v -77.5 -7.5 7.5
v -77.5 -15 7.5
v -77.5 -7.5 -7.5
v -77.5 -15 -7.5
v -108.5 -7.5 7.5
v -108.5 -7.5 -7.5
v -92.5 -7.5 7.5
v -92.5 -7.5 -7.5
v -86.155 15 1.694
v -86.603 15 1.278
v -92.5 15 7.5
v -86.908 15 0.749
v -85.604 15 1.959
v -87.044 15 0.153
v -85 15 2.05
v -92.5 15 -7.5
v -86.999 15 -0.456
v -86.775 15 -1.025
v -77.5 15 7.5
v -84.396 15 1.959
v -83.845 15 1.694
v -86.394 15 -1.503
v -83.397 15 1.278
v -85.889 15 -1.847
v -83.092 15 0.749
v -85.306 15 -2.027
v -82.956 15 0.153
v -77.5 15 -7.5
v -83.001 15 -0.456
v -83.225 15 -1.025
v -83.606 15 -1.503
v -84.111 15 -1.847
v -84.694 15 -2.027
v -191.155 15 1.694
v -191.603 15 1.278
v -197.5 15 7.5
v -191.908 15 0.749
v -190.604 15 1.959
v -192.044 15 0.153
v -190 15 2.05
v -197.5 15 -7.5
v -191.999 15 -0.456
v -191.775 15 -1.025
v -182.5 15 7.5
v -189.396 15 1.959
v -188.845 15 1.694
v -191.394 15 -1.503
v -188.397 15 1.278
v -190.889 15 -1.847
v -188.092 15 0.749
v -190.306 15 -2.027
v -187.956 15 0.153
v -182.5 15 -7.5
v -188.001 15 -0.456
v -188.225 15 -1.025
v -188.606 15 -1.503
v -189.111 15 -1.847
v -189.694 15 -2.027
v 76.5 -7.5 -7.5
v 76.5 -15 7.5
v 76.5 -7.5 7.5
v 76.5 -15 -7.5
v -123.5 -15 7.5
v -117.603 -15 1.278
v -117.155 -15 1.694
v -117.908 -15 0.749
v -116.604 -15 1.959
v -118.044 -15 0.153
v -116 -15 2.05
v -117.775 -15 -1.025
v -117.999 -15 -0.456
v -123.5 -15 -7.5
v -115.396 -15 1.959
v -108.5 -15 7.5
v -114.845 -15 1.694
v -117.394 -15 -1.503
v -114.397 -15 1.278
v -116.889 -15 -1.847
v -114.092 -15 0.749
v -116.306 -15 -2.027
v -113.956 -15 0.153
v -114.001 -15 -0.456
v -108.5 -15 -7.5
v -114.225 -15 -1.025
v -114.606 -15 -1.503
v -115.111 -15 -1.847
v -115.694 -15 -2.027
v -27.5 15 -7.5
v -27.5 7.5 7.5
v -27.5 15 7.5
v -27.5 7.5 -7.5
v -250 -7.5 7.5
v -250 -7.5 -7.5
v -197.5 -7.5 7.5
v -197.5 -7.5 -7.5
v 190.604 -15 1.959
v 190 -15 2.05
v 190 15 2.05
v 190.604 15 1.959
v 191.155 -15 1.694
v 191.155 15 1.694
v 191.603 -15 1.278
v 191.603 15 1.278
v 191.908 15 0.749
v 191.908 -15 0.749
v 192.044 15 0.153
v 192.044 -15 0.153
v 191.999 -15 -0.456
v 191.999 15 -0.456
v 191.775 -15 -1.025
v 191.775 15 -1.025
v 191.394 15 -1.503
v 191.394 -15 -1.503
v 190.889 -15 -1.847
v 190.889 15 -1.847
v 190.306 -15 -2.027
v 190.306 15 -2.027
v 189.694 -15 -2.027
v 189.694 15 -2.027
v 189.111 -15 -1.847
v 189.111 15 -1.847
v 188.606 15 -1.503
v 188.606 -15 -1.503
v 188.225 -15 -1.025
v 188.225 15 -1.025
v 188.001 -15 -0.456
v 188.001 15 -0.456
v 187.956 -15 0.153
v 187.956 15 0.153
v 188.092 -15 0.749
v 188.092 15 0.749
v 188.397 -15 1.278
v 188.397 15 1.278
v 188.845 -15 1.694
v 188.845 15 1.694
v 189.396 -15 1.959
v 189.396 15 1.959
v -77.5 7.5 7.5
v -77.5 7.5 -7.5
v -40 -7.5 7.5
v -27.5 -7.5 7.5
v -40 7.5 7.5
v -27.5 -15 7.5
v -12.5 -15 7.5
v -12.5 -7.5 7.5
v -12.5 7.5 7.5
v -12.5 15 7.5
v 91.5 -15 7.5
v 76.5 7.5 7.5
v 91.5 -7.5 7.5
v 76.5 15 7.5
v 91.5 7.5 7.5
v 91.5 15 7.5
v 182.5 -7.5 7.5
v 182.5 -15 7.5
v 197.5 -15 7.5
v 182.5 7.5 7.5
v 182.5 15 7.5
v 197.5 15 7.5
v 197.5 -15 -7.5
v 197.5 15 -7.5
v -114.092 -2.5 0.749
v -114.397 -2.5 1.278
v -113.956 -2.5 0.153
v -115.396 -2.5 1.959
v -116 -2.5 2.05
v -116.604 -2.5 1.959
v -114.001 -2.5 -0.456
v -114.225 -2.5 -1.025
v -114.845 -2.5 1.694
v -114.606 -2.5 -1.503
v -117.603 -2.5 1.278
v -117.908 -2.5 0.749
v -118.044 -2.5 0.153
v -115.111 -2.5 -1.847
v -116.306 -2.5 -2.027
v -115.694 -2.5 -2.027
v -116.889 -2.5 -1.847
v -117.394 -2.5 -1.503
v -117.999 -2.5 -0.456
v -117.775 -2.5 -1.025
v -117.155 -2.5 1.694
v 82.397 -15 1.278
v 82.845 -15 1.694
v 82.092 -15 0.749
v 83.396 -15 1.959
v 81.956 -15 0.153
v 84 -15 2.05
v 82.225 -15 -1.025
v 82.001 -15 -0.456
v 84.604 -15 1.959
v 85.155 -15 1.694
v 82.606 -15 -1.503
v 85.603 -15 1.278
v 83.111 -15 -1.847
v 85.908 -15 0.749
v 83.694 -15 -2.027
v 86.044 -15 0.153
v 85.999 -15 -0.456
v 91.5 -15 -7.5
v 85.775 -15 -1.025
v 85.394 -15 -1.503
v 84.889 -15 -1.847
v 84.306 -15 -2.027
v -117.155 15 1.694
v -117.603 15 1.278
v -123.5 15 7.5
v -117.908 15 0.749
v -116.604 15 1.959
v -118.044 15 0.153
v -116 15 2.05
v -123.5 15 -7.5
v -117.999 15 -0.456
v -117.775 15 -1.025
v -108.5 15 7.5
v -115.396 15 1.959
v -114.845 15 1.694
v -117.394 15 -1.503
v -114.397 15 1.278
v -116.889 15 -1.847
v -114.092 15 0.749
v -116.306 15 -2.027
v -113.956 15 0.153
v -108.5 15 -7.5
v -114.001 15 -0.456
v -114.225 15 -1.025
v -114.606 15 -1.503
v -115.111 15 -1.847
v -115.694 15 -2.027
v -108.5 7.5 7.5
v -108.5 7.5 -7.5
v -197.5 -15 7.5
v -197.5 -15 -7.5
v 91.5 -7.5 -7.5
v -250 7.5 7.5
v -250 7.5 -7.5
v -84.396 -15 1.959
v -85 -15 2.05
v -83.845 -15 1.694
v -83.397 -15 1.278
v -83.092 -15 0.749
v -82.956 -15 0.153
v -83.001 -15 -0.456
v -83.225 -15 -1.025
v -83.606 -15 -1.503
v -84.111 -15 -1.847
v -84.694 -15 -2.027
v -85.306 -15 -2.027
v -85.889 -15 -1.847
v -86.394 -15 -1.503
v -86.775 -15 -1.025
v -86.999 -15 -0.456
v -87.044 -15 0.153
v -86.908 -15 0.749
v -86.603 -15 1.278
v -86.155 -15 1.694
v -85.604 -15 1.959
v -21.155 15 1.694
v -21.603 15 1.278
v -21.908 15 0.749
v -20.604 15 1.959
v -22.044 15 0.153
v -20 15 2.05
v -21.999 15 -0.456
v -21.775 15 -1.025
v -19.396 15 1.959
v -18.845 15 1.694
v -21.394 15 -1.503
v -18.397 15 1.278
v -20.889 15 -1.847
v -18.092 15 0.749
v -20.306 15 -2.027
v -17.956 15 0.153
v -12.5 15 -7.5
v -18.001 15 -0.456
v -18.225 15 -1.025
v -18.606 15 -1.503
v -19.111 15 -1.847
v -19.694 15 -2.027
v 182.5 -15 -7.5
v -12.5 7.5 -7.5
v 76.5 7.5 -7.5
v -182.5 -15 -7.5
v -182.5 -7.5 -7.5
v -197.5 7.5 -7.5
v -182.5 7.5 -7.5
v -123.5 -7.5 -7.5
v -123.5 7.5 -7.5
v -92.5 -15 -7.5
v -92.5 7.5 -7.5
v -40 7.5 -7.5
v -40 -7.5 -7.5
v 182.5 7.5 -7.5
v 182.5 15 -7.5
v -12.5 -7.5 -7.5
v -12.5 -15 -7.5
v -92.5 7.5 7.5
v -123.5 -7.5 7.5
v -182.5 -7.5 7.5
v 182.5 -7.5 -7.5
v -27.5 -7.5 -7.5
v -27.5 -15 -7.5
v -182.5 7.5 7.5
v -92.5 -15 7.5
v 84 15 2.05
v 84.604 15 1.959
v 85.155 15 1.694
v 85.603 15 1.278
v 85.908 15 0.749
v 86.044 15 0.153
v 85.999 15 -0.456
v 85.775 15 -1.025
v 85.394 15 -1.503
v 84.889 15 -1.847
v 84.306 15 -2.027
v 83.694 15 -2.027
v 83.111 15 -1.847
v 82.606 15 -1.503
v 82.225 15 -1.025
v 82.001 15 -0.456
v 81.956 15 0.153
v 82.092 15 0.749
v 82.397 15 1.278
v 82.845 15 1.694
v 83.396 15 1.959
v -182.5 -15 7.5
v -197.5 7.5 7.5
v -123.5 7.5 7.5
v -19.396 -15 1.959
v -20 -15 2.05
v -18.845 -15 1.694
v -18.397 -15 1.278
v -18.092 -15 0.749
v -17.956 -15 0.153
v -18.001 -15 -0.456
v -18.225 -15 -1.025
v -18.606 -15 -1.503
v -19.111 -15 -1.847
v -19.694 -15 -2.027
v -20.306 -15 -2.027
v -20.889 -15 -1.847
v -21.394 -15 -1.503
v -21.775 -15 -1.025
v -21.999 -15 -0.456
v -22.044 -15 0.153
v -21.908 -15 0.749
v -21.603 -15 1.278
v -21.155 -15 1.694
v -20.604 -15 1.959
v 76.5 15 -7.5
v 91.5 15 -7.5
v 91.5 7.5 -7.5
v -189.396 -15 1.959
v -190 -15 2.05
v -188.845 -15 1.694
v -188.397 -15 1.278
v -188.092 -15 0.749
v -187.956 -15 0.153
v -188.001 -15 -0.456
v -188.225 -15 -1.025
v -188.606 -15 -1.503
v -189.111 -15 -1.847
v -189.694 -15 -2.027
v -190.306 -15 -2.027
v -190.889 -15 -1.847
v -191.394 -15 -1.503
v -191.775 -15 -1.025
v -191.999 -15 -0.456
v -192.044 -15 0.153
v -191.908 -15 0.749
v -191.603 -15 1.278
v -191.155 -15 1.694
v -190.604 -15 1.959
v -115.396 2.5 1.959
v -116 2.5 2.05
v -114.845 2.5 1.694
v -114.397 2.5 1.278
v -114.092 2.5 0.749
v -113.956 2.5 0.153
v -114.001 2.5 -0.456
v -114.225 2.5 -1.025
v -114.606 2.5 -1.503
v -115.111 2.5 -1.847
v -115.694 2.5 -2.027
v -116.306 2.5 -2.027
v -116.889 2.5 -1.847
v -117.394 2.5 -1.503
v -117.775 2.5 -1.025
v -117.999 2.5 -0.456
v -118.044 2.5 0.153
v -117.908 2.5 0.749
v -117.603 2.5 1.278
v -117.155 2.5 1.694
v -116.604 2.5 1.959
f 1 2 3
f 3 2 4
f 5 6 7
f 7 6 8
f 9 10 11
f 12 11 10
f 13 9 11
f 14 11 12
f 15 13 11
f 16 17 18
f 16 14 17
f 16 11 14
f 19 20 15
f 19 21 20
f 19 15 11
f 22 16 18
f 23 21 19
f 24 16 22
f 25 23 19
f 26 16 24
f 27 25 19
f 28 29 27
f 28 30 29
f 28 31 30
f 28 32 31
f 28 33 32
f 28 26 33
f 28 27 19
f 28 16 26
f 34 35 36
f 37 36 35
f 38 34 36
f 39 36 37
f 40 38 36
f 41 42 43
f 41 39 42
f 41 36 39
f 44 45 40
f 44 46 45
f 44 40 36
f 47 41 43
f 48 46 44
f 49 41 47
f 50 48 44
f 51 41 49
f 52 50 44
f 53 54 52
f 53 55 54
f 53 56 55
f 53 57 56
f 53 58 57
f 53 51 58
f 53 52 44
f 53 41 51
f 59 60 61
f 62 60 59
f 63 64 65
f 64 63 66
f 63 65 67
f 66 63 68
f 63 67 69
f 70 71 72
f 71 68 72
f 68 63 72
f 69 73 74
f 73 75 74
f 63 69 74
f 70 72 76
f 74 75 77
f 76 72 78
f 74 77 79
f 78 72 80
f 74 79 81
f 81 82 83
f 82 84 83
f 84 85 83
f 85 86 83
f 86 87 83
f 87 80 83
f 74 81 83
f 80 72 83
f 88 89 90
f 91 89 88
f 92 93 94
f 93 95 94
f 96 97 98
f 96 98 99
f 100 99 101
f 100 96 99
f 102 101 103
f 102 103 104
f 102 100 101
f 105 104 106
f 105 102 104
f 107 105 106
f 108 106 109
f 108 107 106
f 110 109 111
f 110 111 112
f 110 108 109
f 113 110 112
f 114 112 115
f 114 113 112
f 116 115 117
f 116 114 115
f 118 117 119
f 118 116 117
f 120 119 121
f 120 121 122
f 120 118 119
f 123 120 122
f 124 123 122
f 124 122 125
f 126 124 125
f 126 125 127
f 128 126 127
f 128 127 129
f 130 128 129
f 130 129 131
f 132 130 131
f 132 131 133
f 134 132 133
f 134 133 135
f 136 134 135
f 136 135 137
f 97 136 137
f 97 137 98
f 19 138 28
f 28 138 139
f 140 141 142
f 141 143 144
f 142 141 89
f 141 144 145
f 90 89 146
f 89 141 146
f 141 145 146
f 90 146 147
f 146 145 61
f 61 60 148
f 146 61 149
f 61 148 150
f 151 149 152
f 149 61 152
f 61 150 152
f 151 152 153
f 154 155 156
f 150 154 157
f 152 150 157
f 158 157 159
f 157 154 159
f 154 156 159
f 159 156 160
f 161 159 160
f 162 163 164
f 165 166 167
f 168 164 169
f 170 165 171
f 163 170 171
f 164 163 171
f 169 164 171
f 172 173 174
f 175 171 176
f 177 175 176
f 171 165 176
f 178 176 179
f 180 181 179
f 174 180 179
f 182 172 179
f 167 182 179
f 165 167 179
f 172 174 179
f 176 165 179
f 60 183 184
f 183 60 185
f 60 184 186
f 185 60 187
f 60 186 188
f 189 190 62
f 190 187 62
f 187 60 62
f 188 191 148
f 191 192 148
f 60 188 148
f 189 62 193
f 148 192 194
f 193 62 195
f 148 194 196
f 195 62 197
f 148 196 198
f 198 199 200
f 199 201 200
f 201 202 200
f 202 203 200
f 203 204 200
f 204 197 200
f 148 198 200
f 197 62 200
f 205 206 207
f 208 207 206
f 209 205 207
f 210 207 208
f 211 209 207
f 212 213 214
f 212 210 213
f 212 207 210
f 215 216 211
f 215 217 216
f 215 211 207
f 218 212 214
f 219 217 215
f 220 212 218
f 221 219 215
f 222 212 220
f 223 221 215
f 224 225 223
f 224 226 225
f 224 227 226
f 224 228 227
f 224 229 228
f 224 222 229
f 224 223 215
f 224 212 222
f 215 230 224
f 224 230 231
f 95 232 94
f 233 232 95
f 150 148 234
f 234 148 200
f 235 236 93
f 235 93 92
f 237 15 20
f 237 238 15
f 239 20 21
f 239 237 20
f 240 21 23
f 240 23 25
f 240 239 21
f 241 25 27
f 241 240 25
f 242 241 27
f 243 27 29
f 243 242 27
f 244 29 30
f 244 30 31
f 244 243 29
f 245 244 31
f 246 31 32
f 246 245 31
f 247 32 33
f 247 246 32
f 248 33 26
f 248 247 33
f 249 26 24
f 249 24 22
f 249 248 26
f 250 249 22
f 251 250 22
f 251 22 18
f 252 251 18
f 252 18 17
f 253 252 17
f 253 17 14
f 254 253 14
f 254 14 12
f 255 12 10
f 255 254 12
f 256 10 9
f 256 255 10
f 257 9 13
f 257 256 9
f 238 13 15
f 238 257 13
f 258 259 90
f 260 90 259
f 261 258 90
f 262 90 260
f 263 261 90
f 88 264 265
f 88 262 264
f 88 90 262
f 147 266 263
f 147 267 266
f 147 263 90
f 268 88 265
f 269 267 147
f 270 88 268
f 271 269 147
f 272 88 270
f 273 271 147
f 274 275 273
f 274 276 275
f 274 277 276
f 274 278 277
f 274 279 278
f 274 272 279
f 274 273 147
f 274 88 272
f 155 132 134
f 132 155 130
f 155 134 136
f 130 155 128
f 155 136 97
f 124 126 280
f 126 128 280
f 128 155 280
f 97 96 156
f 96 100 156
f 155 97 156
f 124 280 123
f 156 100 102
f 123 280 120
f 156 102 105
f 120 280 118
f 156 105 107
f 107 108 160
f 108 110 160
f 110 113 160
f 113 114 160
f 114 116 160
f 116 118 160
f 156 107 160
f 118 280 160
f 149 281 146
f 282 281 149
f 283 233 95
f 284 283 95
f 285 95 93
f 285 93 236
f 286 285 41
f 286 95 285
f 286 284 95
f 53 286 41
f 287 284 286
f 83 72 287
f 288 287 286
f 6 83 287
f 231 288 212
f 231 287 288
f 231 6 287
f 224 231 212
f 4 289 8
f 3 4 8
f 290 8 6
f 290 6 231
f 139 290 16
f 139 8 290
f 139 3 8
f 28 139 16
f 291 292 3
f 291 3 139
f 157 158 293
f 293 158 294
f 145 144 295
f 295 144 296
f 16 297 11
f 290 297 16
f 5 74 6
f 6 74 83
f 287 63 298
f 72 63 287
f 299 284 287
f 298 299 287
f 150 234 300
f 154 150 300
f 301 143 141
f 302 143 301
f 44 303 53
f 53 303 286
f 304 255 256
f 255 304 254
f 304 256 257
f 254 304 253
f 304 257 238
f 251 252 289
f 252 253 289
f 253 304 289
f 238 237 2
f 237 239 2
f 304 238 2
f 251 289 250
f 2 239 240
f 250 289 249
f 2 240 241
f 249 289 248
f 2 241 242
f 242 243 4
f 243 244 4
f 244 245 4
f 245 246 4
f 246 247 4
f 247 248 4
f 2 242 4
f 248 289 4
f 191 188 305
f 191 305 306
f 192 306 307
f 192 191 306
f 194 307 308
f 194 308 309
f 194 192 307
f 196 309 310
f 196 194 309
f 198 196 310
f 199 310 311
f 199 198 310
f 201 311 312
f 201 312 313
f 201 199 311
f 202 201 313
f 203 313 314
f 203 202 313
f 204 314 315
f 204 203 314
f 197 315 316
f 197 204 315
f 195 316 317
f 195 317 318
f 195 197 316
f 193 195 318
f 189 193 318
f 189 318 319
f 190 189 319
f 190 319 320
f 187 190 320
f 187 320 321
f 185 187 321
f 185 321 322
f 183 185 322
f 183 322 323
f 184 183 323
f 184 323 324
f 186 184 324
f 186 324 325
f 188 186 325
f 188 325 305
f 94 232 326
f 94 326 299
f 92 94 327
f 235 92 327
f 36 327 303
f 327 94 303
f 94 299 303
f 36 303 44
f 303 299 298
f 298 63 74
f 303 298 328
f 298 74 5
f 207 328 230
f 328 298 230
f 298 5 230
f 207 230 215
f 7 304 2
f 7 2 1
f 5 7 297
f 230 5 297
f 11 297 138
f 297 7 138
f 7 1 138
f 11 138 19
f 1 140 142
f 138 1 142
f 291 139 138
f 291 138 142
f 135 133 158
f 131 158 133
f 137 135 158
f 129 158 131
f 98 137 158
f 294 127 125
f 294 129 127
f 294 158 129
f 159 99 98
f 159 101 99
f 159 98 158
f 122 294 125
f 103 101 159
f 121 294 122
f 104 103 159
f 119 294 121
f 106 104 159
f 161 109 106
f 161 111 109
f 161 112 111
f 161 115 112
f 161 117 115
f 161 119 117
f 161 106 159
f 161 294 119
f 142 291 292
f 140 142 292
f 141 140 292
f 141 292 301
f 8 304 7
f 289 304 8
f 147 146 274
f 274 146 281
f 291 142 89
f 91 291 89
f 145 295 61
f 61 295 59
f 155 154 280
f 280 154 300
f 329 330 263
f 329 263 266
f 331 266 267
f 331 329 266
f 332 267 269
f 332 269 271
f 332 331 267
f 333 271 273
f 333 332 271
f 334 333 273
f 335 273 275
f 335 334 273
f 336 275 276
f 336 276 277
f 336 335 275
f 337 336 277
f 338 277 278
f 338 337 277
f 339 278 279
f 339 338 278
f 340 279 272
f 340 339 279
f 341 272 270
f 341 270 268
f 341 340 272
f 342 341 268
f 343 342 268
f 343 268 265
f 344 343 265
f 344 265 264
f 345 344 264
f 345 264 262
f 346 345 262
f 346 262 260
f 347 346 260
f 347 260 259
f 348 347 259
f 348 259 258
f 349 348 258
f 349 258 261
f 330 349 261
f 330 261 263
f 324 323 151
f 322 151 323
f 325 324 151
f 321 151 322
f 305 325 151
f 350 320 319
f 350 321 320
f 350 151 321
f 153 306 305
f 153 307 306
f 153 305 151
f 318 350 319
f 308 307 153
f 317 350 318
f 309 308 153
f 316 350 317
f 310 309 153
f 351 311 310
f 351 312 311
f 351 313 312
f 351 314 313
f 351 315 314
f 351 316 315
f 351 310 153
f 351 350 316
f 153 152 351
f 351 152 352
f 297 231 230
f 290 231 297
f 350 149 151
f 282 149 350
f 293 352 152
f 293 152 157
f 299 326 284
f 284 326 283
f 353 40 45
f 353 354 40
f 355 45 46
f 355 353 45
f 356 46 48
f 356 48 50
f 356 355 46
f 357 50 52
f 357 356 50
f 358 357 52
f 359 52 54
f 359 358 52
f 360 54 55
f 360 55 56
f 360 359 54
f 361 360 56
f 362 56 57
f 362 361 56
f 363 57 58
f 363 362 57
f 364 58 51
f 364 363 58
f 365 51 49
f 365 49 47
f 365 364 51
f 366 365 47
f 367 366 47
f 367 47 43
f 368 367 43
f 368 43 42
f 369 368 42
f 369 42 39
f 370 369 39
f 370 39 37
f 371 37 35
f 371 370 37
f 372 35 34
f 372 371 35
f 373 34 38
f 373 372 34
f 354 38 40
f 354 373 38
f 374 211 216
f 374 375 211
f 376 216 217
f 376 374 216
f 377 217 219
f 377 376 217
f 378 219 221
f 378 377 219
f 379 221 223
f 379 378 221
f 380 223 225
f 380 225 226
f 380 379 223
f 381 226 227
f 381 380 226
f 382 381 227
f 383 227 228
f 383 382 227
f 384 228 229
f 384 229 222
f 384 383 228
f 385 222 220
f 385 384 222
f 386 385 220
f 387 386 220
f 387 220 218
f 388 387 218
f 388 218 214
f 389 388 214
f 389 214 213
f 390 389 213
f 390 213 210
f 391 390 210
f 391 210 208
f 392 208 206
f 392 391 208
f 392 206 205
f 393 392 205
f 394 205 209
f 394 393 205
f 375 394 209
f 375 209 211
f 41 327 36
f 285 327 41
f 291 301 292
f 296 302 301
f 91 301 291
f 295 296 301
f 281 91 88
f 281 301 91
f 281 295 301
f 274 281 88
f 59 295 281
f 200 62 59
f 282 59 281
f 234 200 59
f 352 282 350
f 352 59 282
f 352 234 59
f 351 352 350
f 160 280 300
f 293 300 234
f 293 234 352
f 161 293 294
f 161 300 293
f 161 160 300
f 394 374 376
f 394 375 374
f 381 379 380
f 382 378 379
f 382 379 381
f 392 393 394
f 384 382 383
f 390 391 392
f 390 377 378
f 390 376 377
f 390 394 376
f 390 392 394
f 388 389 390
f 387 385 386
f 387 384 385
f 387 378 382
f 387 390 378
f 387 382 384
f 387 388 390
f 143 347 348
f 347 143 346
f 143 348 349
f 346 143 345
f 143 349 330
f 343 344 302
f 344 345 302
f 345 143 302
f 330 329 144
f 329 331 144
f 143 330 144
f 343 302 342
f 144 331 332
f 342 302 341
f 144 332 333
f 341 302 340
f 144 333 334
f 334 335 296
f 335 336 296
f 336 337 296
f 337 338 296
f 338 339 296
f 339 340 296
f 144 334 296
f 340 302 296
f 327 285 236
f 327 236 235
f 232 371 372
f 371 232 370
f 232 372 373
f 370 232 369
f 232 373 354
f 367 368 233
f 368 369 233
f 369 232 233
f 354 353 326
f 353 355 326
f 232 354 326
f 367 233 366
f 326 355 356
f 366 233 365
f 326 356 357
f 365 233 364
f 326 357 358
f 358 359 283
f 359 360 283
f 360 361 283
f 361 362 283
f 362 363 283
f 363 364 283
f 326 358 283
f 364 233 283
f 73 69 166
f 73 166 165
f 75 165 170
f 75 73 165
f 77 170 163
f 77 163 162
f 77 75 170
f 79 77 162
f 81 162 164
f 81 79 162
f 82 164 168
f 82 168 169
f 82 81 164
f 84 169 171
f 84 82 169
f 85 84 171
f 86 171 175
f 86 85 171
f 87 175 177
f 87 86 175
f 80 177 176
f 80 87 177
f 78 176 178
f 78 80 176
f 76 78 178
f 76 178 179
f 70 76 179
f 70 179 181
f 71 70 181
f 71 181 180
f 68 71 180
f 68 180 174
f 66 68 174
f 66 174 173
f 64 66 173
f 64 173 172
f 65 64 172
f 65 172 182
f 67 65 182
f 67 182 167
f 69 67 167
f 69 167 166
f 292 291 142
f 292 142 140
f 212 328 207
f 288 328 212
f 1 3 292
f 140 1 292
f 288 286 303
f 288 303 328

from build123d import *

# Parameters (mm, degrees)
SKETCH1_W                  = 400
SKETCH1_H                  = 15
BOSS_EXTRUDE1_DEPTH        = 7.5
F_4_1_4_1_DIAMETER_HOLE1_D = 4.1
SKETCH4_R                  = 2.05
BOSS_EXTRUDE2_DEPTH        = 2.5
SKETCH5_W                  = 15
SKETCH5_H                  = 15
SKETCH5_R                  = 2.05
BOSS_EXTRUDE3_DEPTH        = 15
SKETCH6_W                  = 15
SKETCH6_H                  = 15
BOSS_EXTRUDE5_DEPTH        = 50
SKETCH8_W                  = 15
SKETCH8_H                  = 15
CUT_EXTRUDE1_DEPTH         = 2.5
SPLIT1_SURFACE_1_BACK      = 449.755
SPLIT1_SURFACE_1_DEPTH     = 899.51
SPLIT1_SURFACE_2_BACK      = 449.755
SPLIT1_SURFACE_2_DEPTH     = 899.51


with BuildPart() as part:
    # Sketch1 → Boss-Extrude1 (new, symmetric)
    with BuildSketch(Plane(origin=(0, 0, 0), x_dir=(1, 0, 0), z_dir=(0, 1, 0))):
        Rectangle(SKETCH1_W, SKETCH1_H)
    extrude(amount=BOSS_EXTRUDE1_DEPTH, both=True)

    # Ø4.1 (4.1) Diameter Hole1 (through all)
    with Locations(Plane.XZ.offset(7.5)):
        with Locations((-190, 0), (-116, 0), (-85, 0), (-20, 0), (84, 0), (190, 0)):
            Hole(F_4_1_4_1_DIAMETER_HOLE1_D / 2)

    # Sketch4 → Boss-Extrude2 (add, symmetric)
    with BuildSketch(Plane(origin=(0, 0, 0), x_dir=(1, 0, 0), z_dir=(0, 1, 0))):
        with Locations(Location((-116, 0, 0), (0, 0, 90))):
            Circle(SKETCH4_R)
    extrude(amount=BOSS_EXTRUDE2_DEPTH, both=True)

    # Sketch5 → Boss-Extrude3 (add, symmetric)
    with BuildSketch(Plane(origin=(0, 0, 0), x_dir=(1, 0, 0), z_dir=(0, 1, 0))):
        with Locations((-190, 0)):
            Rectangle(SKETCH5_W, SKETCH5_H)
        with Locations(Location((-190, 0, 0), (0, 0, 270))):
            Circle(SKETCH5_R, mode=Mode.SUBTRACT)
        with Locations((-116, 0)):
            Rectangle(SKETCH5_W, SKETCH5_H)
        with Locations(Location((-116, 0, 0), (0, 0, 270))):
            Circle(SKETCH5_R, mode=Mode.SUBTRACT)
        with Locations((-85, 0)):
            Rectangle(SKETCH5_W, SKETCH5_H)
        with Locations(Location((-85, 0, 0), (0, 0, 270))):
            Circle(SKETCH5_R, mode=Mode.SUBTRACT)
        with Locations((-20, 0)):
            Rectangle(SKETCH5_W, SKETCH5_H)
        with Locations(Location((-20, 0, 0), (0, 0, 270))):
            Circle(SKETCH5_R, mode=Mode.SUBTRACT)
        with Locations((84, 0)):
            Rectangle(SKETCH5_W, SKETCH5_H)
        with Locations(Location((84, 0, 0), (0, 0, 270))):
            Circle(SKETCH5_R, mode=Mode.SUBTRACT)
        with Locations((190, 0)):
            Rectangle(SKETCH5_W, SKETCH5_H)
        with Locations(Location((190, 0, 0), (0, 0, 270))):
            Circle(SKETCH5_R, mode=Mode.SUBTRACT)
    extrude(amount=BOSS_EXTRUDE3_DEPTH, both=True)

    # Sketch6 → Boss-Extrude5 (add)
    with BuildSketch(Plane.ZY.offset(200)):
        Rectangle(SKETCH6_W, SKETCH6_H)
    extrude(amount=BOSS_EXTRUDE5_DEPTH)

    # Sketch8 → Cut-Extrude1 (cut)
    with BuildSketch(Plane(origin=(200, 0, 0), x_dir=(0, 0, -1), z_dir=(1, 0, 0))):
        Rectangle(SKETCH8_W, SKETCH8_H)
    extrude(amount=-CUT_EXTRUDE1_DEPTH, mode=Mode.SUBTRACT)


with BuildPart() as body_2:
    # Split1: the piece behind the surface
    add(part.part)
    # Split1 surface: a surface, the sketch's curves swept straight by 899.51 mm
    with BuildLine(Plane.XY.offset(7.5).offset(-SPLIT1_SURFACE_1_BACK), mode=Mode.PRIVATE) as split1_surface_1_path:
        Line((-40, 7.5), (-40, -7.5))
    split1_surface_1 = Shell.extrude(split1_surface_1_path.wire(), (0 * SPLIT1_SURFACE_1_DEPTH, 0 * SPLIT1_SURFACE_1_DEPTH, 1 * SPLIT1_SURFACE_1_DEPTH))
    split(bisect_by=split1_surface_1, keep=Keep.BOTTOM)


with BuildPart() as part_1:
    add(part.part)

    # Split1: split by a surface, the side it looks to stays
    # Split1 surface: a surface, the sketch's curves swept straight by 899.51 mm
    with BuildLine(Plane.XY.offset(7.5).offset(-SPLIT1_SURFACE_2_BACK), mode=Mode.PRIVATE) as split1_surface_2_path:
        Line((-40, 7.5), (-40, -7.5))
    split1_surface_2 = Shell.extrude(split1_surface_2_path.wire(), (0 * SPLIT1_SURFACE_2_DEPTH, 0 * SPLIT1_SURFACE_2_DEPTH, 1 * SPLIT1_SURFACE_2_DEPTH))
    split(bisect_by=split1_surface_2, keep=Keep.TOP)


solid = Compound([body_2.part, part_1.part])
